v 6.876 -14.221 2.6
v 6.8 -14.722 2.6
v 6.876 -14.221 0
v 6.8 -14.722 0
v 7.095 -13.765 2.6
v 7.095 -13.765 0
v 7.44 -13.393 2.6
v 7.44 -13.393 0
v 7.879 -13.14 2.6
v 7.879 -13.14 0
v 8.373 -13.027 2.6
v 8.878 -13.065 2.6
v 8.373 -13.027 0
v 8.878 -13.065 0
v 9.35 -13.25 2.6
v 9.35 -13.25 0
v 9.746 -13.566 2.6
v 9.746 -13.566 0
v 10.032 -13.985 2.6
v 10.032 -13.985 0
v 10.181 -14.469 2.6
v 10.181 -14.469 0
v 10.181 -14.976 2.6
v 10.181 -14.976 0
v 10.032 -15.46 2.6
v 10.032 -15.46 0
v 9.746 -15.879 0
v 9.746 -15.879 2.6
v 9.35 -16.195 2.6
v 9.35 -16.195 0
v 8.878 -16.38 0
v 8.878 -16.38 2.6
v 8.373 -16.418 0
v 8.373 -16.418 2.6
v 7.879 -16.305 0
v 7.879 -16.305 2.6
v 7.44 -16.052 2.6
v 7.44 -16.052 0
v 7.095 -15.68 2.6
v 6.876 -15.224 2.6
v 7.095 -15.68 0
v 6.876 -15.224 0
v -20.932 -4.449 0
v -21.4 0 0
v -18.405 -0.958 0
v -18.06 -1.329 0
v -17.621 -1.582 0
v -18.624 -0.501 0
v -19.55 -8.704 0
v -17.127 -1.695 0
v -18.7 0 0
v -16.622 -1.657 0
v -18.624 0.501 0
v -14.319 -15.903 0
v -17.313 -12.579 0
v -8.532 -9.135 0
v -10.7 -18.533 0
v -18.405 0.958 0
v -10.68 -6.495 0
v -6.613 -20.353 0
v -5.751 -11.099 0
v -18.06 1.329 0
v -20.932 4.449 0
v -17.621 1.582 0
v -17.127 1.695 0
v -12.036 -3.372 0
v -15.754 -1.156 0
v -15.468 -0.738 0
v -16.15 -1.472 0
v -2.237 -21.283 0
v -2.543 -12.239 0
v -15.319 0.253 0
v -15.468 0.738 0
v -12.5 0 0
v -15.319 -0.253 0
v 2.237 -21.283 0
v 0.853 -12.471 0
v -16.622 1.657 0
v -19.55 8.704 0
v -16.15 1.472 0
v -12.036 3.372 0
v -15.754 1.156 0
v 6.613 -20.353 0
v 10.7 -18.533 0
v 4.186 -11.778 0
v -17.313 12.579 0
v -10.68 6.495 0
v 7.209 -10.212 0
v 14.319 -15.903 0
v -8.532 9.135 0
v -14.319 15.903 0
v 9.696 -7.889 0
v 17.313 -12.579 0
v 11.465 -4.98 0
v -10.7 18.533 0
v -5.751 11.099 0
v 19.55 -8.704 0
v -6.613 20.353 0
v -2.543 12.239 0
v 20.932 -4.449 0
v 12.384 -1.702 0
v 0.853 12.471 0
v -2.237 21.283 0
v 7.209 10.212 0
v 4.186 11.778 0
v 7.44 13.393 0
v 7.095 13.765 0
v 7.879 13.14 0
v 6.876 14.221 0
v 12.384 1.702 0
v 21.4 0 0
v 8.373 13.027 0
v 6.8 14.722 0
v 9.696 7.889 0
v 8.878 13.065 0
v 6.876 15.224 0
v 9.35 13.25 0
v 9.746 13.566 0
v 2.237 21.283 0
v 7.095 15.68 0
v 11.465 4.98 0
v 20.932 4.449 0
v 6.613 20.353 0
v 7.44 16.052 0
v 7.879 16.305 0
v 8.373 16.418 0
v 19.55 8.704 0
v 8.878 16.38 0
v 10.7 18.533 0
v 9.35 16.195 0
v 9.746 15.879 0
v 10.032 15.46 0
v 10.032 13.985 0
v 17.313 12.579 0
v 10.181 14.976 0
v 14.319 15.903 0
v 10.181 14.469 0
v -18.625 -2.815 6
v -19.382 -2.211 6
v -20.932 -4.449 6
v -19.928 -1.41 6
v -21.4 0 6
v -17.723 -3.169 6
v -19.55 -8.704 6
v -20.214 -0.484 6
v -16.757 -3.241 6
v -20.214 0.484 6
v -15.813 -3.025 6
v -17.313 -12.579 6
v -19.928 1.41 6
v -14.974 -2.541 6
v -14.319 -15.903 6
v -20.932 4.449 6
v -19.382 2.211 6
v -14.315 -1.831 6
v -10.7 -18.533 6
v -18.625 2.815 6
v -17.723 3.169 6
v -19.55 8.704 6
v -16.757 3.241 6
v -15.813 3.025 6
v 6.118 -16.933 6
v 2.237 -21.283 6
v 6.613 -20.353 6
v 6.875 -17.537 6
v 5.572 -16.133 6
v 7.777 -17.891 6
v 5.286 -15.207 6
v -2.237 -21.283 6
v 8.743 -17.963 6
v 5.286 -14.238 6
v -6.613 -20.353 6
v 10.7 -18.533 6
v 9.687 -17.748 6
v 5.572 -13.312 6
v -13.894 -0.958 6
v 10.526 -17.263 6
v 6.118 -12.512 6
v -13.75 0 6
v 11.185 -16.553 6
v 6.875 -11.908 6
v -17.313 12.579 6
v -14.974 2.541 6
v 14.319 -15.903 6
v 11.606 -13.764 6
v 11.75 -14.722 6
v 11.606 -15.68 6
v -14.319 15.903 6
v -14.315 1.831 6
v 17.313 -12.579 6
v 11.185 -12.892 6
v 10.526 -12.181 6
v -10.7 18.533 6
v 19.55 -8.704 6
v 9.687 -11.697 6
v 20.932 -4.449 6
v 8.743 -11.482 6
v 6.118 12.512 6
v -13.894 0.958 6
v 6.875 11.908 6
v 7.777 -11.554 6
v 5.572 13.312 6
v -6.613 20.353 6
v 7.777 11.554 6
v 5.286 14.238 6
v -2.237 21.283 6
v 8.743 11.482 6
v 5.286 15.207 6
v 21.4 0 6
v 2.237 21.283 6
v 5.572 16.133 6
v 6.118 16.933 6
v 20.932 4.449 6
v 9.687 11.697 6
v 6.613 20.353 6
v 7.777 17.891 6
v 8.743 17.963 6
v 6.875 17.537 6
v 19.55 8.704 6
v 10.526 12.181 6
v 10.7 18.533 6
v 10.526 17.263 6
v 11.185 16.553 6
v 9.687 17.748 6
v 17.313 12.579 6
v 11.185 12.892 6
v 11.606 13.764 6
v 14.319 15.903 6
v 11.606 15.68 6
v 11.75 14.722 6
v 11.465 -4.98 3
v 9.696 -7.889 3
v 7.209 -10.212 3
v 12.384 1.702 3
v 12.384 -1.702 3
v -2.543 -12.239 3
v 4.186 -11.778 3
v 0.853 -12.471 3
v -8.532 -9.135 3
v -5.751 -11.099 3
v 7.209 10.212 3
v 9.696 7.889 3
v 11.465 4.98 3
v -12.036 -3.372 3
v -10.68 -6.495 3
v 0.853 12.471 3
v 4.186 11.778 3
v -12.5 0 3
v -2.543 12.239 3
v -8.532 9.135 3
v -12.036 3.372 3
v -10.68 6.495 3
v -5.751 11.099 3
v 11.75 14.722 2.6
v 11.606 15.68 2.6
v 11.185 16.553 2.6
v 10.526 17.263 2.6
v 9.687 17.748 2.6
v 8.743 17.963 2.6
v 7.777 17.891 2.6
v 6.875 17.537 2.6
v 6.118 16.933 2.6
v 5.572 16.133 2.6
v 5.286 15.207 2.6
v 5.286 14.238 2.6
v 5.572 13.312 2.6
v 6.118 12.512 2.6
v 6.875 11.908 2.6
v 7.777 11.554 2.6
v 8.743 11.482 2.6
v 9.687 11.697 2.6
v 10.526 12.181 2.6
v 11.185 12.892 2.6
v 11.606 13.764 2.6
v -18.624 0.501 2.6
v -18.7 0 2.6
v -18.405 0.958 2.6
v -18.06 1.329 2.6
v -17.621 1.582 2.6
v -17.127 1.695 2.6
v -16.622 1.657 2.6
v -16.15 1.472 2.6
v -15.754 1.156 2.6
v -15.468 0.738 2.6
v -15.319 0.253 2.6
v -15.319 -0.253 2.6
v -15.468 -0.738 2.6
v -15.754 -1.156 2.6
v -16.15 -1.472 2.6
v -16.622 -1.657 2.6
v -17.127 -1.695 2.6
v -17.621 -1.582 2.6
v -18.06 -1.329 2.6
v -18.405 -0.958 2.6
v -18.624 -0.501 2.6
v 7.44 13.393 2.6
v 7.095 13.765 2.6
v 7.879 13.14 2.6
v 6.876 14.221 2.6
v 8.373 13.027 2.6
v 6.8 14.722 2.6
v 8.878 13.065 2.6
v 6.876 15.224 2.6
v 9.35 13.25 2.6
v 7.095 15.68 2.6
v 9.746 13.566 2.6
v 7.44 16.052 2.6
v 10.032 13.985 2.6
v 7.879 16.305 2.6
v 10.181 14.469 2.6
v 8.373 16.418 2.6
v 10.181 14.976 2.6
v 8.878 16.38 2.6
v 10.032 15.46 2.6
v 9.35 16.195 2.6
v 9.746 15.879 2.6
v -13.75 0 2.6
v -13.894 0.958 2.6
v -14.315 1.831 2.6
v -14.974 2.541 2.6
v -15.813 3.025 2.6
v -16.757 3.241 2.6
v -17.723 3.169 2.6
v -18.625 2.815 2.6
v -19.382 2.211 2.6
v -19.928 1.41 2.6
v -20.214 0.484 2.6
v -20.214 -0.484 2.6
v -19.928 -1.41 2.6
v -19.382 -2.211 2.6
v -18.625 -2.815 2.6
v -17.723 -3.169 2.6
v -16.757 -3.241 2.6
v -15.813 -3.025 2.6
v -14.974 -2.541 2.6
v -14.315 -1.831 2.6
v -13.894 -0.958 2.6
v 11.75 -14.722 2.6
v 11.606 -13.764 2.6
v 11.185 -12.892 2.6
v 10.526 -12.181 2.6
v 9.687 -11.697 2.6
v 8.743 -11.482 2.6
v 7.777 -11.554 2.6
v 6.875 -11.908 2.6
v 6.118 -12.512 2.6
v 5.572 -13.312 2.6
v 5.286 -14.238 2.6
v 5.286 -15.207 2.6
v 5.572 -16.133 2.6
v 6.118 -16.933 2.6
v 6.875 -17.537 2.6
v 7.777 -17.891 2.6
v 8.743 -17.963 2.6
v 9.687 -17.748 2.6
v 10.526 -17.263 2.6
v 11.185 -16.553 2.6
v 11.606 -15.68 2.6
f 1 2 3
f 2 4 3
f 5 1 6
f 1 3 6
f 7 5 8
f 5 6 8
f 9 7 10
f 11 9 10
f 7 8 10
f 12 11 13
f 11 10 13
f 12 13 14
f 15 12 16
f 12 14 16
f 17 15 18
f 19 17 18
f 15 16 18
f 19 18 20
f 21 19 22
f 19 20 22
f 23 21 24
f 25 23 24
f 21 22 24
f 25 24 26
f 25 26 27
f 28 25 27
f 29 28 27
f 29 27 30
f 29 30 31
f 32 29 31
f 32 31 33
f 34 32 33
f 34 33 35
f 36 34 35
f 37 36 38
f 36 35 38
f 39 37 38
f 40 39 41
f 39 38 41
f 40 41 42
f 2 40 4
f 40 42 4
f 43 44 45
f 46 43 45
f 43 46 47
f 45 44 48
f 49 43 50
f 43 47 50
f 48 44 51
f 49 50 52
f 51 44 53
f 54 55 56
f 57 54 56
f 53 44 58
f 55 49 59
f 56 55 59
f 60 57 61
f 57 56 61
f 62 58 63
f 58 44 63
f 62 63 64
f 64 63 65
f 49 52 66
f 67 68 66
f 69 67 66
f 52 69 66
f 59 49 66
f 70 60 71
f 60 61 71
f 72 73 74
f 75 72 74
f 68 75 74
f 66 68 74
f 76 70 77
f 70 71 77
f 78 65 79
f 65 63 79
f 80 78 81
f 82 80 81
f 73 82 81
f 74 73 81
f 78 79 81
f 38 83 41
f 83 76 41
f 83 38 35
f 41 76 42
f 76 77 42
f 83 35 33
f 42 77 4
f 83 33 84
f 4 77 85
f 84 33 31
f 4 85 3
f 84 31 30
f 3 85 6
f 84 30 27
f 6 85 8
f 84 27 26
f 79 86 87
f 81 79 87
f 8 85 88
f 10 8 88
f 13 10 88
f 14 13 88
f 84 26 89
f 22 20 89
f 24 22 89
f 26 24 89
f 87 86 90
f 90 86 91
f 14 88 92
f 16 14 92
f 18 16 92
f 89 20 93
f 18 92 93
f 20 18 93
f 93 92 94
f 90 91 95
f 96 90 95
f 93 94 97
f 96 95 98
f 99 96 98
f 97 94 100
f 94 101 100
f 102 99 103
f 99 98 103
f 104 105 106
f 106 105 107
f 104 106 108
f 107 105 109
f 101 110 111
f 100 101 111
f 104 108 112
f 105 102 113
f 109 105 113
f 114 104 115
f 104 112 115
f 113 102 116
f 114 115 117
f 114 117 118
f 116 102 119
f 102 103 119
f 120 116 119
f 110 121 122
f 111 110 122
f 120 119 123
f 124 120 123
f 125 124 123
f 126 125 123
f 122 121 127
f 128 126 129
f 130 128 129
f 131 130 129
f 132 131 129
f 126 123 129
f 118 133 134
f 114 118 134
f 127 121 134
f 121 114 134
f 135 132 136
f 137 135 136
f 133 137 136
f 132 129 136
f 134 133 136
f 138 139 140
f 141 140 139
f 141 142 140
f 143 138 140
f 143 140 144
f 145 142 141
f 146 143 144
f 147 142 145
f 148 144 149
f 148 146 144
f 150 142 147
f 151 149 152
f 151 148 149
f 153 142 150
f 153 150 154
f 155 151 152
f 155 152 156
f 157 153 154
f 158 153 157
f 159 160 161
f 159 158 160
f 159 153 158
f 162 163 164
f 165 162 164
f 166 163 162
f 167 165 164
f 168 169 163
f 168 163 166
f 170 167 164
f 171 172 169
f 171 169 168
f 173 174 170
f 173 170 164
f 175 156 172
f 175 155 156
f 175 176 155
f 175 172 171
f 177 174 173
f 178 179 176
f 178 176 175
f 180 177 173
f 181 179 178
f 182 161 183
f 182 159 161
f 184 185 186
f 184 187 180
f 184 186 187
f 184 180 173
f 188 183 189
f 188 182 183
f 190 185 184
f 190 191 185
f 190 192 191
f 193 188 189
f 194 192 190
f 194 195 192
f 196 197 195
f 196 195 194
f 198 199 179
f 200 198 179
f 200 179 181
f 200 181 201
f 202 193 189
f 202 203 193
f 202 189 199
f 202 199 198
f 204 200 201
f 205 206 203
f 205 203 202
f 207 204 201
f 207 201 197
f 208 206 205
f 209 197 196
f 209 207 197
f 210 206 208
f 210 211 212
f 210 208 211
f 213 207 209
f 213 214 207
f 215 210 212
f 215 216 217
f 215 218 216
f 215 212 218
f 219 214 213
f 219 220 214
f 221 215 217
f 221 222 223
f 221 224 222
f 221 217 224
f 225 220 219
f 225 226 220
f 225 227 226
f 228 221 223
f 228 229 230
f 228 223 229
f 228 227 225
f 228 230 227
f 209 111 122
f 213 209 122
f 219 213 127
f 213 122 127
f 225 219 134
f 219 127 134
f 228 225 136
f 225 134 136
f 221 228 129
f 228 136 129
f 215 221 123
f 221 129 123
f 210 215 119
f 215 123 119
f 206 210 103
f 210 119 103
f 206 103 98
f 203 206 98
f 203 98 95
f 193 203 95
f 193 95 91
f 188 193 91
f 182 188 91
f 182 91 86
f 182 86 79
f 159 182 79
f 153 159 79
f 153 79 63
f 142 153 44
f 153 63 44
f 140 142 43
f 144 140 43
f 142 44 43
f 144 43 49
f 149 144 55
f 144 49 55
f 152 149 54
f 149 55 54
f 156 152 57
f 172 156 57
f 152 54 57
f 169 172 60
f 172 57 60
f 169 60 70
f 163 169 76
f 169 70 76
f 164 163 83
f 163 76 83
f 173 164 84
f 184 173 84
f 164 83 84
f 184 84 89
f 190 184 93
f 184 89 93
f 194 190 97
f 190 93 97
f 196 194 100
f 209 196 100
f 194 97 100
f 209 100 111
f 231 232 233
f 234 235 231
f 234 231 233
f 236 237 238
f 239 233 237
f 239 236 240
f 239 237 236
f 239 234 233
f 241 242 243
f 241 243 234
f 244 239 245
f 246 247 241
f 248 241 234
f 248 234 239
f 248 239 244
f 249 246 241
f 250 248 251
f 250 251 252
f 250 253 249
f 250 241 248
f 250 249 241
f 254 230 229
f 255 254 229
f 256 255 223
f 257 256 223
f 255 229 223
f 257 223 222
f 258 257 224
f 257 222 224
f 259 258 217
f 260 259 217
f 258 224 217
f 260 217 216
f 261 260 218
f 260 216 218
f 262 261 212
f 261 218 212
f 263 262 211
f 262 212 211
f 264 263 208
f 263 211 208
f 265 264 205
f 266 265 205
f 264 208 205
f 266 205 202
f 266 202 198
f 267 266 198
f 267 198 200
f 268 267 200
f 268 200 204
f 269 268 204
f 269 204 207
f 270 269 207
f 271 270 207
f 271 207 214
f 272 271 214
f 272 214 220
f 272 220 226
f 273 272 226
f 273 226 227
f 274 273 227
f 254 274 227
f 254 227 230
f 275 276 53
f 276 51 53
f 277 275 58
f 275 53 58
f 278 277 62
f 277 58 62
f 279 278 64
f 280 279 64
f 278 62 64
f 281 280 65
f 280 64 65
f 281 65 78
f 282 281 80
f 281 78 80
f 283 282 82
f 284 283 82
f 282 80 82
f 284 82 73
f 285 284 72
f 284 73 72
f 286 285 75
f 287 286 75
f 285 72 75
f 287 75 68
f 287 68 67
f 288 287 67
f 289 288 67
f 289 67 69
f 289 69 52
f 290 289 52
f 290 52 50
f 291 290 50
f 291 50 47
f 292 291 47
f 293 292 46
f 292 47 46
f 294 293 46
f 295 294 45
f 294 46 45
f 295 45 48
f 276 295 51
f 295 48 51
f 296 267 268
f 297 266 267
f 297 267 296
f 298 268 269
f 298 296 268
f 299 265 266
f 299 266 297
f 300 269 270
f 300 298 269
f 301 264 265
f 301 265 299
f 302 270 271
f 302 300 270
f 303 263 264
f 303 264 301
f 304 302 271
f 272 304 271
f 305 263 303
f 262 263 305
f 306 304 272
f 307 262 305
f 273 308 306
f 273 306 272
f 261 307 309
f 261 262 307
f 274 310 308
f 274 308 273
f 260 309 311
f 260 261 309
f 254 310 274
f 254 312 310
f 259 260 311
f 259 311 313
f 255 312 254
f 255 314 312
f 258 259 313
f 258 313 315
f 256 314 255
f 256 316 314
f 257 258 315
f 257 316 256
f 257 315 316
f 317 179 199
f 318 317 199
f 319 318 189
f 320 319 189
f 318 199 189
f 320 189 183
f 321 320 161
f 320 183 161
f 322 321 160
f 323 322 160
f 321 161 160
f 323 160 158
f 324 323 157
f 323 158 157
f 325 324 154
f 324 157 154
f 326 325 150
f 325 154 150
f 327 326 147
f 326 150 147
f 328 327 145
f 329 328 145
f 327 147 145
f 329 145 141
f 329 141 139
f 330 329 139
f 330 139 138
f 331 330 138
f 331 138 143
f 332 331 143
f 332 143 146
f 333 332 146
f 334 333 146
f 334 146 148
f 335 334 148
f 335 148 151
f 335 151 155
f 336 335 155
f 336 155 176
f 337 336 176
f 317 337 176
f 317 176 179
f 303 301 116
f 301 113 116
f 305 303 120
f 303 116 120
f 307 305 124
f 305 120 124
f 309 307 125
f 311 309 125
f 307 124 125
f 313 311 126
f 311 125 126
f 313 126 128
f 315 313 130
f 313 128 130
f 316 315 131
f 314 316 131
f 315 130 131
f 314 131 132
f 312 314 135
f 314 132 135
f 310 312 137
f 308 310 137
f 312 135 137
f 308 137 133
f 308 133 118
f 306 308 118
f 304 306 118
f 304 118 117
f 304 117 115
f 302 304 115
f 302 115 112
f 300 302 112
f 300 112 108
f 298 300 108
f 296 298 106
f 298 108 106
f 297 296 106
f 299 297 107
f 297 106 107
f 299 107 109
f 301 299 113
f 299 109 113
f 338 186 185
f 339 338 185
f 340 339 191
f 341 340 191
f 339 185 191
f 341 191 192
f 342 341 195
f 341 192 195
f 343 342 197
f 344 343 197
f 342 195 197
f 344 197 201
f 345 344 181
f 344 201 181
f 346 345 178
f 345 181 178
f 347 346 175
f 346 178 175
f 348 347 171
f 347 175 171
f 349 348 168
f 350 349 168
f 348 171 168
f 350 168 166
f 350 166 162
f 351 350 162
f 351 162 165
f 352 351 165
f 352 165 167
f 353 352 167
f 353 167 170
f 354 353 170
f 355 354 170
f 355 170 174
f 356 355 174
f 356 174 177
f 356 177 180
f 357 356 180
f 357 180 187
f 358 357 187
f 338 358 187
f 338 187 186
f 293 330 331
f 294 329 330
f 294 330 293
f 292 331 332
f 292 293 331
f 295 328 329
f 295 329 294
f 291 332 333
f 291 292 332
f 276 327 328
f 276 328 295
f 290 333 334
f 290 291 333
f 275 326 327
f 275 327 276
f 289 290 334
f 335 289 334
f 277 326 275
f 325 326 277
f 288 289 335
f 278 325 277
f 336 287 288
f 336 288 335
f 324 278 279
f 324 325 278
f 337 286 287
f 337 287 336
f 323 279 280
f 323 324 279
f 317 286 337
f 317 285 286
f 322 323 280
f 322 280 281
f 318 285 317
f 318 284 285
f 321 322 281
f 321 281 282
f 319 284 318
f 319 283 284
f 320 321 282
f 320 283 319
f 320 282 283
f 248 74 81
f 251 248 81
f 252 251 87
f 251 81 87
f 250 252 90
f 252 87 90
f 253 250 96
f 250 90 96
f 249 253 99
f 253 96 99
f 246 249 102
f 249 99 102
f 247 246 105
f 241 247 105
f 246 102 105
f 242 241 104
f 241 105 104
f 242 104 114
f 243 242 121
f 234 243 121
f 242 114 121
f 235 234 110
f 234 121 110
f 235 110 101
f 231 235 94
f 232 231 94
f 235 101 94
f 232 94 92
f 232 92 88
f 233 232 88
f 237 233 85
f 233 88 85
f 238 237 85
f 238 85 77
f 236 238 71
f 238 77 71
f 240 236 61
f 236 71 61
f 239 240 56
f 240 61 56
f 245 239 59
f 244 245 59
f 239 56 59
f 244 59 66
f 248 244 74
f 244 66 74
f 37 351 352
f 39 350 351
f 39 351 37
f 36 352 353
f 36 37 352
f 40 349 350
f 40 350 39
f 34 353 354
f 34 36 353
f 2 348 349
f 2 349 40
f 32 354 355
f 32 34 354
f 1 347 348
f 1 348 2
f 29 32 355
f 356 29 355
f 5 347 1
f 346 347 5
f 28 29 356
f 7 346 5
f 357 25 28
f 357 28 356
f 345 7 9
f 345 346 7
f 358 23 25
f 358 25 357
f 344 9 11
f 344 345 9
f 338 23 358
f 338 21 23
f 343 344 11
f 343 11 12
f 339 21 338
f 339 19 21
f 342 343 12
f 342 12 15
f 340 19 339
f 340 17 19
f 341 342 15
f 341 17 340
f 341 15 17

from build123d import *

# Parameters (mm, degrees)
ESQUISSE1_R                                        = 21.4
BOSS_EXTRU_1_DEPTH                                 = 6
ESQUISSE2_R                                        = 12.5
ENL_V_MAT_EXTRU_1_DEPTH                            = 3
CHAMBRAGE_POUR_VIS_T_TE_HEXAGONALE_M31_D           = 3.4
CHAMBRAGE_POUR_VIS_T_TE_HEXAGONALE_M31_DEPTH       = 8
CHAMBRAGE_POUR_VIS_T_TE_HEXAGONALE_M31_CBORE_D     = 6.5
CHAMBRAGE_POUR_VIS_T_TE_HEXAGONALE_M31_CBORE_DEPTH = 3.4
CHAMBRAGE_POUR_VIS_T_TE_HEXAGONALE_M31_TIP         = 1.021463052


with BuildPart() as part:
    # Esquisse1 → Boss.-Extru.1 (new body)
    with BuildSketch(Plane.XY):
        Circle(ESQUISSE1_R)
    extrude(amount=BOSS_EXTRU_1_DEPTH)

    # Esquisse2 → Enlèv. mat.-Extru.1 (cut)
    with BuildSketch(Plane(origin=(0, 0, 0), x_dir=(-1, 0, 0), z_dir=(0, 0, -1))):
        Circle(ESQUISSE2_R)
    extrude(amount=-ENL_V_MAT_EXTRU_1_DEPTH, mode=Mode.SUBTRACT)

    # Chambrage pour vis à tête hexagonale M31
    with Locations(Plane.XY.offset(6)):
        with Locations((-17, 0), (8.5, 14.722431864), (8.5, -14.722431864)):
            CounterBoreHole(CHAMBRAGE_POUR_VIS_T_TE_HEXAGONALE_M31_D / 2, CHAMBRAGE_POUR_VIS_T_TE_HEXAGONALE_M31_CBORE_D / 2, CHAMBRAGE_POUR_VIS_T_TE_HEXAGONALE_M31_CBORE_DEPTH, depth=CHAMBRAGE_POUR_VIS_T_TE_HEXAGONALE_M31_DEPTH)
            with Locations((0, 0, -(CHAMBRAGE_POUR_VIS_T_TE_HEXAGONALE_M31_DEPTH + CHAMBRAGE_POUR_VIS_T_TE_HEXAGONALE_M31_TIP / 2))):  # 118° drill point
                Cone(0, CHAMBRAGE_POUR_VIS_T_TE_HEXAGONALE_M31_D / 2, CHAMBRAGE_POUR_VIS_T_TE_HEXAGONALE_M31_TIP, mode=Mode.SUBTRACT)


solid = part.part
